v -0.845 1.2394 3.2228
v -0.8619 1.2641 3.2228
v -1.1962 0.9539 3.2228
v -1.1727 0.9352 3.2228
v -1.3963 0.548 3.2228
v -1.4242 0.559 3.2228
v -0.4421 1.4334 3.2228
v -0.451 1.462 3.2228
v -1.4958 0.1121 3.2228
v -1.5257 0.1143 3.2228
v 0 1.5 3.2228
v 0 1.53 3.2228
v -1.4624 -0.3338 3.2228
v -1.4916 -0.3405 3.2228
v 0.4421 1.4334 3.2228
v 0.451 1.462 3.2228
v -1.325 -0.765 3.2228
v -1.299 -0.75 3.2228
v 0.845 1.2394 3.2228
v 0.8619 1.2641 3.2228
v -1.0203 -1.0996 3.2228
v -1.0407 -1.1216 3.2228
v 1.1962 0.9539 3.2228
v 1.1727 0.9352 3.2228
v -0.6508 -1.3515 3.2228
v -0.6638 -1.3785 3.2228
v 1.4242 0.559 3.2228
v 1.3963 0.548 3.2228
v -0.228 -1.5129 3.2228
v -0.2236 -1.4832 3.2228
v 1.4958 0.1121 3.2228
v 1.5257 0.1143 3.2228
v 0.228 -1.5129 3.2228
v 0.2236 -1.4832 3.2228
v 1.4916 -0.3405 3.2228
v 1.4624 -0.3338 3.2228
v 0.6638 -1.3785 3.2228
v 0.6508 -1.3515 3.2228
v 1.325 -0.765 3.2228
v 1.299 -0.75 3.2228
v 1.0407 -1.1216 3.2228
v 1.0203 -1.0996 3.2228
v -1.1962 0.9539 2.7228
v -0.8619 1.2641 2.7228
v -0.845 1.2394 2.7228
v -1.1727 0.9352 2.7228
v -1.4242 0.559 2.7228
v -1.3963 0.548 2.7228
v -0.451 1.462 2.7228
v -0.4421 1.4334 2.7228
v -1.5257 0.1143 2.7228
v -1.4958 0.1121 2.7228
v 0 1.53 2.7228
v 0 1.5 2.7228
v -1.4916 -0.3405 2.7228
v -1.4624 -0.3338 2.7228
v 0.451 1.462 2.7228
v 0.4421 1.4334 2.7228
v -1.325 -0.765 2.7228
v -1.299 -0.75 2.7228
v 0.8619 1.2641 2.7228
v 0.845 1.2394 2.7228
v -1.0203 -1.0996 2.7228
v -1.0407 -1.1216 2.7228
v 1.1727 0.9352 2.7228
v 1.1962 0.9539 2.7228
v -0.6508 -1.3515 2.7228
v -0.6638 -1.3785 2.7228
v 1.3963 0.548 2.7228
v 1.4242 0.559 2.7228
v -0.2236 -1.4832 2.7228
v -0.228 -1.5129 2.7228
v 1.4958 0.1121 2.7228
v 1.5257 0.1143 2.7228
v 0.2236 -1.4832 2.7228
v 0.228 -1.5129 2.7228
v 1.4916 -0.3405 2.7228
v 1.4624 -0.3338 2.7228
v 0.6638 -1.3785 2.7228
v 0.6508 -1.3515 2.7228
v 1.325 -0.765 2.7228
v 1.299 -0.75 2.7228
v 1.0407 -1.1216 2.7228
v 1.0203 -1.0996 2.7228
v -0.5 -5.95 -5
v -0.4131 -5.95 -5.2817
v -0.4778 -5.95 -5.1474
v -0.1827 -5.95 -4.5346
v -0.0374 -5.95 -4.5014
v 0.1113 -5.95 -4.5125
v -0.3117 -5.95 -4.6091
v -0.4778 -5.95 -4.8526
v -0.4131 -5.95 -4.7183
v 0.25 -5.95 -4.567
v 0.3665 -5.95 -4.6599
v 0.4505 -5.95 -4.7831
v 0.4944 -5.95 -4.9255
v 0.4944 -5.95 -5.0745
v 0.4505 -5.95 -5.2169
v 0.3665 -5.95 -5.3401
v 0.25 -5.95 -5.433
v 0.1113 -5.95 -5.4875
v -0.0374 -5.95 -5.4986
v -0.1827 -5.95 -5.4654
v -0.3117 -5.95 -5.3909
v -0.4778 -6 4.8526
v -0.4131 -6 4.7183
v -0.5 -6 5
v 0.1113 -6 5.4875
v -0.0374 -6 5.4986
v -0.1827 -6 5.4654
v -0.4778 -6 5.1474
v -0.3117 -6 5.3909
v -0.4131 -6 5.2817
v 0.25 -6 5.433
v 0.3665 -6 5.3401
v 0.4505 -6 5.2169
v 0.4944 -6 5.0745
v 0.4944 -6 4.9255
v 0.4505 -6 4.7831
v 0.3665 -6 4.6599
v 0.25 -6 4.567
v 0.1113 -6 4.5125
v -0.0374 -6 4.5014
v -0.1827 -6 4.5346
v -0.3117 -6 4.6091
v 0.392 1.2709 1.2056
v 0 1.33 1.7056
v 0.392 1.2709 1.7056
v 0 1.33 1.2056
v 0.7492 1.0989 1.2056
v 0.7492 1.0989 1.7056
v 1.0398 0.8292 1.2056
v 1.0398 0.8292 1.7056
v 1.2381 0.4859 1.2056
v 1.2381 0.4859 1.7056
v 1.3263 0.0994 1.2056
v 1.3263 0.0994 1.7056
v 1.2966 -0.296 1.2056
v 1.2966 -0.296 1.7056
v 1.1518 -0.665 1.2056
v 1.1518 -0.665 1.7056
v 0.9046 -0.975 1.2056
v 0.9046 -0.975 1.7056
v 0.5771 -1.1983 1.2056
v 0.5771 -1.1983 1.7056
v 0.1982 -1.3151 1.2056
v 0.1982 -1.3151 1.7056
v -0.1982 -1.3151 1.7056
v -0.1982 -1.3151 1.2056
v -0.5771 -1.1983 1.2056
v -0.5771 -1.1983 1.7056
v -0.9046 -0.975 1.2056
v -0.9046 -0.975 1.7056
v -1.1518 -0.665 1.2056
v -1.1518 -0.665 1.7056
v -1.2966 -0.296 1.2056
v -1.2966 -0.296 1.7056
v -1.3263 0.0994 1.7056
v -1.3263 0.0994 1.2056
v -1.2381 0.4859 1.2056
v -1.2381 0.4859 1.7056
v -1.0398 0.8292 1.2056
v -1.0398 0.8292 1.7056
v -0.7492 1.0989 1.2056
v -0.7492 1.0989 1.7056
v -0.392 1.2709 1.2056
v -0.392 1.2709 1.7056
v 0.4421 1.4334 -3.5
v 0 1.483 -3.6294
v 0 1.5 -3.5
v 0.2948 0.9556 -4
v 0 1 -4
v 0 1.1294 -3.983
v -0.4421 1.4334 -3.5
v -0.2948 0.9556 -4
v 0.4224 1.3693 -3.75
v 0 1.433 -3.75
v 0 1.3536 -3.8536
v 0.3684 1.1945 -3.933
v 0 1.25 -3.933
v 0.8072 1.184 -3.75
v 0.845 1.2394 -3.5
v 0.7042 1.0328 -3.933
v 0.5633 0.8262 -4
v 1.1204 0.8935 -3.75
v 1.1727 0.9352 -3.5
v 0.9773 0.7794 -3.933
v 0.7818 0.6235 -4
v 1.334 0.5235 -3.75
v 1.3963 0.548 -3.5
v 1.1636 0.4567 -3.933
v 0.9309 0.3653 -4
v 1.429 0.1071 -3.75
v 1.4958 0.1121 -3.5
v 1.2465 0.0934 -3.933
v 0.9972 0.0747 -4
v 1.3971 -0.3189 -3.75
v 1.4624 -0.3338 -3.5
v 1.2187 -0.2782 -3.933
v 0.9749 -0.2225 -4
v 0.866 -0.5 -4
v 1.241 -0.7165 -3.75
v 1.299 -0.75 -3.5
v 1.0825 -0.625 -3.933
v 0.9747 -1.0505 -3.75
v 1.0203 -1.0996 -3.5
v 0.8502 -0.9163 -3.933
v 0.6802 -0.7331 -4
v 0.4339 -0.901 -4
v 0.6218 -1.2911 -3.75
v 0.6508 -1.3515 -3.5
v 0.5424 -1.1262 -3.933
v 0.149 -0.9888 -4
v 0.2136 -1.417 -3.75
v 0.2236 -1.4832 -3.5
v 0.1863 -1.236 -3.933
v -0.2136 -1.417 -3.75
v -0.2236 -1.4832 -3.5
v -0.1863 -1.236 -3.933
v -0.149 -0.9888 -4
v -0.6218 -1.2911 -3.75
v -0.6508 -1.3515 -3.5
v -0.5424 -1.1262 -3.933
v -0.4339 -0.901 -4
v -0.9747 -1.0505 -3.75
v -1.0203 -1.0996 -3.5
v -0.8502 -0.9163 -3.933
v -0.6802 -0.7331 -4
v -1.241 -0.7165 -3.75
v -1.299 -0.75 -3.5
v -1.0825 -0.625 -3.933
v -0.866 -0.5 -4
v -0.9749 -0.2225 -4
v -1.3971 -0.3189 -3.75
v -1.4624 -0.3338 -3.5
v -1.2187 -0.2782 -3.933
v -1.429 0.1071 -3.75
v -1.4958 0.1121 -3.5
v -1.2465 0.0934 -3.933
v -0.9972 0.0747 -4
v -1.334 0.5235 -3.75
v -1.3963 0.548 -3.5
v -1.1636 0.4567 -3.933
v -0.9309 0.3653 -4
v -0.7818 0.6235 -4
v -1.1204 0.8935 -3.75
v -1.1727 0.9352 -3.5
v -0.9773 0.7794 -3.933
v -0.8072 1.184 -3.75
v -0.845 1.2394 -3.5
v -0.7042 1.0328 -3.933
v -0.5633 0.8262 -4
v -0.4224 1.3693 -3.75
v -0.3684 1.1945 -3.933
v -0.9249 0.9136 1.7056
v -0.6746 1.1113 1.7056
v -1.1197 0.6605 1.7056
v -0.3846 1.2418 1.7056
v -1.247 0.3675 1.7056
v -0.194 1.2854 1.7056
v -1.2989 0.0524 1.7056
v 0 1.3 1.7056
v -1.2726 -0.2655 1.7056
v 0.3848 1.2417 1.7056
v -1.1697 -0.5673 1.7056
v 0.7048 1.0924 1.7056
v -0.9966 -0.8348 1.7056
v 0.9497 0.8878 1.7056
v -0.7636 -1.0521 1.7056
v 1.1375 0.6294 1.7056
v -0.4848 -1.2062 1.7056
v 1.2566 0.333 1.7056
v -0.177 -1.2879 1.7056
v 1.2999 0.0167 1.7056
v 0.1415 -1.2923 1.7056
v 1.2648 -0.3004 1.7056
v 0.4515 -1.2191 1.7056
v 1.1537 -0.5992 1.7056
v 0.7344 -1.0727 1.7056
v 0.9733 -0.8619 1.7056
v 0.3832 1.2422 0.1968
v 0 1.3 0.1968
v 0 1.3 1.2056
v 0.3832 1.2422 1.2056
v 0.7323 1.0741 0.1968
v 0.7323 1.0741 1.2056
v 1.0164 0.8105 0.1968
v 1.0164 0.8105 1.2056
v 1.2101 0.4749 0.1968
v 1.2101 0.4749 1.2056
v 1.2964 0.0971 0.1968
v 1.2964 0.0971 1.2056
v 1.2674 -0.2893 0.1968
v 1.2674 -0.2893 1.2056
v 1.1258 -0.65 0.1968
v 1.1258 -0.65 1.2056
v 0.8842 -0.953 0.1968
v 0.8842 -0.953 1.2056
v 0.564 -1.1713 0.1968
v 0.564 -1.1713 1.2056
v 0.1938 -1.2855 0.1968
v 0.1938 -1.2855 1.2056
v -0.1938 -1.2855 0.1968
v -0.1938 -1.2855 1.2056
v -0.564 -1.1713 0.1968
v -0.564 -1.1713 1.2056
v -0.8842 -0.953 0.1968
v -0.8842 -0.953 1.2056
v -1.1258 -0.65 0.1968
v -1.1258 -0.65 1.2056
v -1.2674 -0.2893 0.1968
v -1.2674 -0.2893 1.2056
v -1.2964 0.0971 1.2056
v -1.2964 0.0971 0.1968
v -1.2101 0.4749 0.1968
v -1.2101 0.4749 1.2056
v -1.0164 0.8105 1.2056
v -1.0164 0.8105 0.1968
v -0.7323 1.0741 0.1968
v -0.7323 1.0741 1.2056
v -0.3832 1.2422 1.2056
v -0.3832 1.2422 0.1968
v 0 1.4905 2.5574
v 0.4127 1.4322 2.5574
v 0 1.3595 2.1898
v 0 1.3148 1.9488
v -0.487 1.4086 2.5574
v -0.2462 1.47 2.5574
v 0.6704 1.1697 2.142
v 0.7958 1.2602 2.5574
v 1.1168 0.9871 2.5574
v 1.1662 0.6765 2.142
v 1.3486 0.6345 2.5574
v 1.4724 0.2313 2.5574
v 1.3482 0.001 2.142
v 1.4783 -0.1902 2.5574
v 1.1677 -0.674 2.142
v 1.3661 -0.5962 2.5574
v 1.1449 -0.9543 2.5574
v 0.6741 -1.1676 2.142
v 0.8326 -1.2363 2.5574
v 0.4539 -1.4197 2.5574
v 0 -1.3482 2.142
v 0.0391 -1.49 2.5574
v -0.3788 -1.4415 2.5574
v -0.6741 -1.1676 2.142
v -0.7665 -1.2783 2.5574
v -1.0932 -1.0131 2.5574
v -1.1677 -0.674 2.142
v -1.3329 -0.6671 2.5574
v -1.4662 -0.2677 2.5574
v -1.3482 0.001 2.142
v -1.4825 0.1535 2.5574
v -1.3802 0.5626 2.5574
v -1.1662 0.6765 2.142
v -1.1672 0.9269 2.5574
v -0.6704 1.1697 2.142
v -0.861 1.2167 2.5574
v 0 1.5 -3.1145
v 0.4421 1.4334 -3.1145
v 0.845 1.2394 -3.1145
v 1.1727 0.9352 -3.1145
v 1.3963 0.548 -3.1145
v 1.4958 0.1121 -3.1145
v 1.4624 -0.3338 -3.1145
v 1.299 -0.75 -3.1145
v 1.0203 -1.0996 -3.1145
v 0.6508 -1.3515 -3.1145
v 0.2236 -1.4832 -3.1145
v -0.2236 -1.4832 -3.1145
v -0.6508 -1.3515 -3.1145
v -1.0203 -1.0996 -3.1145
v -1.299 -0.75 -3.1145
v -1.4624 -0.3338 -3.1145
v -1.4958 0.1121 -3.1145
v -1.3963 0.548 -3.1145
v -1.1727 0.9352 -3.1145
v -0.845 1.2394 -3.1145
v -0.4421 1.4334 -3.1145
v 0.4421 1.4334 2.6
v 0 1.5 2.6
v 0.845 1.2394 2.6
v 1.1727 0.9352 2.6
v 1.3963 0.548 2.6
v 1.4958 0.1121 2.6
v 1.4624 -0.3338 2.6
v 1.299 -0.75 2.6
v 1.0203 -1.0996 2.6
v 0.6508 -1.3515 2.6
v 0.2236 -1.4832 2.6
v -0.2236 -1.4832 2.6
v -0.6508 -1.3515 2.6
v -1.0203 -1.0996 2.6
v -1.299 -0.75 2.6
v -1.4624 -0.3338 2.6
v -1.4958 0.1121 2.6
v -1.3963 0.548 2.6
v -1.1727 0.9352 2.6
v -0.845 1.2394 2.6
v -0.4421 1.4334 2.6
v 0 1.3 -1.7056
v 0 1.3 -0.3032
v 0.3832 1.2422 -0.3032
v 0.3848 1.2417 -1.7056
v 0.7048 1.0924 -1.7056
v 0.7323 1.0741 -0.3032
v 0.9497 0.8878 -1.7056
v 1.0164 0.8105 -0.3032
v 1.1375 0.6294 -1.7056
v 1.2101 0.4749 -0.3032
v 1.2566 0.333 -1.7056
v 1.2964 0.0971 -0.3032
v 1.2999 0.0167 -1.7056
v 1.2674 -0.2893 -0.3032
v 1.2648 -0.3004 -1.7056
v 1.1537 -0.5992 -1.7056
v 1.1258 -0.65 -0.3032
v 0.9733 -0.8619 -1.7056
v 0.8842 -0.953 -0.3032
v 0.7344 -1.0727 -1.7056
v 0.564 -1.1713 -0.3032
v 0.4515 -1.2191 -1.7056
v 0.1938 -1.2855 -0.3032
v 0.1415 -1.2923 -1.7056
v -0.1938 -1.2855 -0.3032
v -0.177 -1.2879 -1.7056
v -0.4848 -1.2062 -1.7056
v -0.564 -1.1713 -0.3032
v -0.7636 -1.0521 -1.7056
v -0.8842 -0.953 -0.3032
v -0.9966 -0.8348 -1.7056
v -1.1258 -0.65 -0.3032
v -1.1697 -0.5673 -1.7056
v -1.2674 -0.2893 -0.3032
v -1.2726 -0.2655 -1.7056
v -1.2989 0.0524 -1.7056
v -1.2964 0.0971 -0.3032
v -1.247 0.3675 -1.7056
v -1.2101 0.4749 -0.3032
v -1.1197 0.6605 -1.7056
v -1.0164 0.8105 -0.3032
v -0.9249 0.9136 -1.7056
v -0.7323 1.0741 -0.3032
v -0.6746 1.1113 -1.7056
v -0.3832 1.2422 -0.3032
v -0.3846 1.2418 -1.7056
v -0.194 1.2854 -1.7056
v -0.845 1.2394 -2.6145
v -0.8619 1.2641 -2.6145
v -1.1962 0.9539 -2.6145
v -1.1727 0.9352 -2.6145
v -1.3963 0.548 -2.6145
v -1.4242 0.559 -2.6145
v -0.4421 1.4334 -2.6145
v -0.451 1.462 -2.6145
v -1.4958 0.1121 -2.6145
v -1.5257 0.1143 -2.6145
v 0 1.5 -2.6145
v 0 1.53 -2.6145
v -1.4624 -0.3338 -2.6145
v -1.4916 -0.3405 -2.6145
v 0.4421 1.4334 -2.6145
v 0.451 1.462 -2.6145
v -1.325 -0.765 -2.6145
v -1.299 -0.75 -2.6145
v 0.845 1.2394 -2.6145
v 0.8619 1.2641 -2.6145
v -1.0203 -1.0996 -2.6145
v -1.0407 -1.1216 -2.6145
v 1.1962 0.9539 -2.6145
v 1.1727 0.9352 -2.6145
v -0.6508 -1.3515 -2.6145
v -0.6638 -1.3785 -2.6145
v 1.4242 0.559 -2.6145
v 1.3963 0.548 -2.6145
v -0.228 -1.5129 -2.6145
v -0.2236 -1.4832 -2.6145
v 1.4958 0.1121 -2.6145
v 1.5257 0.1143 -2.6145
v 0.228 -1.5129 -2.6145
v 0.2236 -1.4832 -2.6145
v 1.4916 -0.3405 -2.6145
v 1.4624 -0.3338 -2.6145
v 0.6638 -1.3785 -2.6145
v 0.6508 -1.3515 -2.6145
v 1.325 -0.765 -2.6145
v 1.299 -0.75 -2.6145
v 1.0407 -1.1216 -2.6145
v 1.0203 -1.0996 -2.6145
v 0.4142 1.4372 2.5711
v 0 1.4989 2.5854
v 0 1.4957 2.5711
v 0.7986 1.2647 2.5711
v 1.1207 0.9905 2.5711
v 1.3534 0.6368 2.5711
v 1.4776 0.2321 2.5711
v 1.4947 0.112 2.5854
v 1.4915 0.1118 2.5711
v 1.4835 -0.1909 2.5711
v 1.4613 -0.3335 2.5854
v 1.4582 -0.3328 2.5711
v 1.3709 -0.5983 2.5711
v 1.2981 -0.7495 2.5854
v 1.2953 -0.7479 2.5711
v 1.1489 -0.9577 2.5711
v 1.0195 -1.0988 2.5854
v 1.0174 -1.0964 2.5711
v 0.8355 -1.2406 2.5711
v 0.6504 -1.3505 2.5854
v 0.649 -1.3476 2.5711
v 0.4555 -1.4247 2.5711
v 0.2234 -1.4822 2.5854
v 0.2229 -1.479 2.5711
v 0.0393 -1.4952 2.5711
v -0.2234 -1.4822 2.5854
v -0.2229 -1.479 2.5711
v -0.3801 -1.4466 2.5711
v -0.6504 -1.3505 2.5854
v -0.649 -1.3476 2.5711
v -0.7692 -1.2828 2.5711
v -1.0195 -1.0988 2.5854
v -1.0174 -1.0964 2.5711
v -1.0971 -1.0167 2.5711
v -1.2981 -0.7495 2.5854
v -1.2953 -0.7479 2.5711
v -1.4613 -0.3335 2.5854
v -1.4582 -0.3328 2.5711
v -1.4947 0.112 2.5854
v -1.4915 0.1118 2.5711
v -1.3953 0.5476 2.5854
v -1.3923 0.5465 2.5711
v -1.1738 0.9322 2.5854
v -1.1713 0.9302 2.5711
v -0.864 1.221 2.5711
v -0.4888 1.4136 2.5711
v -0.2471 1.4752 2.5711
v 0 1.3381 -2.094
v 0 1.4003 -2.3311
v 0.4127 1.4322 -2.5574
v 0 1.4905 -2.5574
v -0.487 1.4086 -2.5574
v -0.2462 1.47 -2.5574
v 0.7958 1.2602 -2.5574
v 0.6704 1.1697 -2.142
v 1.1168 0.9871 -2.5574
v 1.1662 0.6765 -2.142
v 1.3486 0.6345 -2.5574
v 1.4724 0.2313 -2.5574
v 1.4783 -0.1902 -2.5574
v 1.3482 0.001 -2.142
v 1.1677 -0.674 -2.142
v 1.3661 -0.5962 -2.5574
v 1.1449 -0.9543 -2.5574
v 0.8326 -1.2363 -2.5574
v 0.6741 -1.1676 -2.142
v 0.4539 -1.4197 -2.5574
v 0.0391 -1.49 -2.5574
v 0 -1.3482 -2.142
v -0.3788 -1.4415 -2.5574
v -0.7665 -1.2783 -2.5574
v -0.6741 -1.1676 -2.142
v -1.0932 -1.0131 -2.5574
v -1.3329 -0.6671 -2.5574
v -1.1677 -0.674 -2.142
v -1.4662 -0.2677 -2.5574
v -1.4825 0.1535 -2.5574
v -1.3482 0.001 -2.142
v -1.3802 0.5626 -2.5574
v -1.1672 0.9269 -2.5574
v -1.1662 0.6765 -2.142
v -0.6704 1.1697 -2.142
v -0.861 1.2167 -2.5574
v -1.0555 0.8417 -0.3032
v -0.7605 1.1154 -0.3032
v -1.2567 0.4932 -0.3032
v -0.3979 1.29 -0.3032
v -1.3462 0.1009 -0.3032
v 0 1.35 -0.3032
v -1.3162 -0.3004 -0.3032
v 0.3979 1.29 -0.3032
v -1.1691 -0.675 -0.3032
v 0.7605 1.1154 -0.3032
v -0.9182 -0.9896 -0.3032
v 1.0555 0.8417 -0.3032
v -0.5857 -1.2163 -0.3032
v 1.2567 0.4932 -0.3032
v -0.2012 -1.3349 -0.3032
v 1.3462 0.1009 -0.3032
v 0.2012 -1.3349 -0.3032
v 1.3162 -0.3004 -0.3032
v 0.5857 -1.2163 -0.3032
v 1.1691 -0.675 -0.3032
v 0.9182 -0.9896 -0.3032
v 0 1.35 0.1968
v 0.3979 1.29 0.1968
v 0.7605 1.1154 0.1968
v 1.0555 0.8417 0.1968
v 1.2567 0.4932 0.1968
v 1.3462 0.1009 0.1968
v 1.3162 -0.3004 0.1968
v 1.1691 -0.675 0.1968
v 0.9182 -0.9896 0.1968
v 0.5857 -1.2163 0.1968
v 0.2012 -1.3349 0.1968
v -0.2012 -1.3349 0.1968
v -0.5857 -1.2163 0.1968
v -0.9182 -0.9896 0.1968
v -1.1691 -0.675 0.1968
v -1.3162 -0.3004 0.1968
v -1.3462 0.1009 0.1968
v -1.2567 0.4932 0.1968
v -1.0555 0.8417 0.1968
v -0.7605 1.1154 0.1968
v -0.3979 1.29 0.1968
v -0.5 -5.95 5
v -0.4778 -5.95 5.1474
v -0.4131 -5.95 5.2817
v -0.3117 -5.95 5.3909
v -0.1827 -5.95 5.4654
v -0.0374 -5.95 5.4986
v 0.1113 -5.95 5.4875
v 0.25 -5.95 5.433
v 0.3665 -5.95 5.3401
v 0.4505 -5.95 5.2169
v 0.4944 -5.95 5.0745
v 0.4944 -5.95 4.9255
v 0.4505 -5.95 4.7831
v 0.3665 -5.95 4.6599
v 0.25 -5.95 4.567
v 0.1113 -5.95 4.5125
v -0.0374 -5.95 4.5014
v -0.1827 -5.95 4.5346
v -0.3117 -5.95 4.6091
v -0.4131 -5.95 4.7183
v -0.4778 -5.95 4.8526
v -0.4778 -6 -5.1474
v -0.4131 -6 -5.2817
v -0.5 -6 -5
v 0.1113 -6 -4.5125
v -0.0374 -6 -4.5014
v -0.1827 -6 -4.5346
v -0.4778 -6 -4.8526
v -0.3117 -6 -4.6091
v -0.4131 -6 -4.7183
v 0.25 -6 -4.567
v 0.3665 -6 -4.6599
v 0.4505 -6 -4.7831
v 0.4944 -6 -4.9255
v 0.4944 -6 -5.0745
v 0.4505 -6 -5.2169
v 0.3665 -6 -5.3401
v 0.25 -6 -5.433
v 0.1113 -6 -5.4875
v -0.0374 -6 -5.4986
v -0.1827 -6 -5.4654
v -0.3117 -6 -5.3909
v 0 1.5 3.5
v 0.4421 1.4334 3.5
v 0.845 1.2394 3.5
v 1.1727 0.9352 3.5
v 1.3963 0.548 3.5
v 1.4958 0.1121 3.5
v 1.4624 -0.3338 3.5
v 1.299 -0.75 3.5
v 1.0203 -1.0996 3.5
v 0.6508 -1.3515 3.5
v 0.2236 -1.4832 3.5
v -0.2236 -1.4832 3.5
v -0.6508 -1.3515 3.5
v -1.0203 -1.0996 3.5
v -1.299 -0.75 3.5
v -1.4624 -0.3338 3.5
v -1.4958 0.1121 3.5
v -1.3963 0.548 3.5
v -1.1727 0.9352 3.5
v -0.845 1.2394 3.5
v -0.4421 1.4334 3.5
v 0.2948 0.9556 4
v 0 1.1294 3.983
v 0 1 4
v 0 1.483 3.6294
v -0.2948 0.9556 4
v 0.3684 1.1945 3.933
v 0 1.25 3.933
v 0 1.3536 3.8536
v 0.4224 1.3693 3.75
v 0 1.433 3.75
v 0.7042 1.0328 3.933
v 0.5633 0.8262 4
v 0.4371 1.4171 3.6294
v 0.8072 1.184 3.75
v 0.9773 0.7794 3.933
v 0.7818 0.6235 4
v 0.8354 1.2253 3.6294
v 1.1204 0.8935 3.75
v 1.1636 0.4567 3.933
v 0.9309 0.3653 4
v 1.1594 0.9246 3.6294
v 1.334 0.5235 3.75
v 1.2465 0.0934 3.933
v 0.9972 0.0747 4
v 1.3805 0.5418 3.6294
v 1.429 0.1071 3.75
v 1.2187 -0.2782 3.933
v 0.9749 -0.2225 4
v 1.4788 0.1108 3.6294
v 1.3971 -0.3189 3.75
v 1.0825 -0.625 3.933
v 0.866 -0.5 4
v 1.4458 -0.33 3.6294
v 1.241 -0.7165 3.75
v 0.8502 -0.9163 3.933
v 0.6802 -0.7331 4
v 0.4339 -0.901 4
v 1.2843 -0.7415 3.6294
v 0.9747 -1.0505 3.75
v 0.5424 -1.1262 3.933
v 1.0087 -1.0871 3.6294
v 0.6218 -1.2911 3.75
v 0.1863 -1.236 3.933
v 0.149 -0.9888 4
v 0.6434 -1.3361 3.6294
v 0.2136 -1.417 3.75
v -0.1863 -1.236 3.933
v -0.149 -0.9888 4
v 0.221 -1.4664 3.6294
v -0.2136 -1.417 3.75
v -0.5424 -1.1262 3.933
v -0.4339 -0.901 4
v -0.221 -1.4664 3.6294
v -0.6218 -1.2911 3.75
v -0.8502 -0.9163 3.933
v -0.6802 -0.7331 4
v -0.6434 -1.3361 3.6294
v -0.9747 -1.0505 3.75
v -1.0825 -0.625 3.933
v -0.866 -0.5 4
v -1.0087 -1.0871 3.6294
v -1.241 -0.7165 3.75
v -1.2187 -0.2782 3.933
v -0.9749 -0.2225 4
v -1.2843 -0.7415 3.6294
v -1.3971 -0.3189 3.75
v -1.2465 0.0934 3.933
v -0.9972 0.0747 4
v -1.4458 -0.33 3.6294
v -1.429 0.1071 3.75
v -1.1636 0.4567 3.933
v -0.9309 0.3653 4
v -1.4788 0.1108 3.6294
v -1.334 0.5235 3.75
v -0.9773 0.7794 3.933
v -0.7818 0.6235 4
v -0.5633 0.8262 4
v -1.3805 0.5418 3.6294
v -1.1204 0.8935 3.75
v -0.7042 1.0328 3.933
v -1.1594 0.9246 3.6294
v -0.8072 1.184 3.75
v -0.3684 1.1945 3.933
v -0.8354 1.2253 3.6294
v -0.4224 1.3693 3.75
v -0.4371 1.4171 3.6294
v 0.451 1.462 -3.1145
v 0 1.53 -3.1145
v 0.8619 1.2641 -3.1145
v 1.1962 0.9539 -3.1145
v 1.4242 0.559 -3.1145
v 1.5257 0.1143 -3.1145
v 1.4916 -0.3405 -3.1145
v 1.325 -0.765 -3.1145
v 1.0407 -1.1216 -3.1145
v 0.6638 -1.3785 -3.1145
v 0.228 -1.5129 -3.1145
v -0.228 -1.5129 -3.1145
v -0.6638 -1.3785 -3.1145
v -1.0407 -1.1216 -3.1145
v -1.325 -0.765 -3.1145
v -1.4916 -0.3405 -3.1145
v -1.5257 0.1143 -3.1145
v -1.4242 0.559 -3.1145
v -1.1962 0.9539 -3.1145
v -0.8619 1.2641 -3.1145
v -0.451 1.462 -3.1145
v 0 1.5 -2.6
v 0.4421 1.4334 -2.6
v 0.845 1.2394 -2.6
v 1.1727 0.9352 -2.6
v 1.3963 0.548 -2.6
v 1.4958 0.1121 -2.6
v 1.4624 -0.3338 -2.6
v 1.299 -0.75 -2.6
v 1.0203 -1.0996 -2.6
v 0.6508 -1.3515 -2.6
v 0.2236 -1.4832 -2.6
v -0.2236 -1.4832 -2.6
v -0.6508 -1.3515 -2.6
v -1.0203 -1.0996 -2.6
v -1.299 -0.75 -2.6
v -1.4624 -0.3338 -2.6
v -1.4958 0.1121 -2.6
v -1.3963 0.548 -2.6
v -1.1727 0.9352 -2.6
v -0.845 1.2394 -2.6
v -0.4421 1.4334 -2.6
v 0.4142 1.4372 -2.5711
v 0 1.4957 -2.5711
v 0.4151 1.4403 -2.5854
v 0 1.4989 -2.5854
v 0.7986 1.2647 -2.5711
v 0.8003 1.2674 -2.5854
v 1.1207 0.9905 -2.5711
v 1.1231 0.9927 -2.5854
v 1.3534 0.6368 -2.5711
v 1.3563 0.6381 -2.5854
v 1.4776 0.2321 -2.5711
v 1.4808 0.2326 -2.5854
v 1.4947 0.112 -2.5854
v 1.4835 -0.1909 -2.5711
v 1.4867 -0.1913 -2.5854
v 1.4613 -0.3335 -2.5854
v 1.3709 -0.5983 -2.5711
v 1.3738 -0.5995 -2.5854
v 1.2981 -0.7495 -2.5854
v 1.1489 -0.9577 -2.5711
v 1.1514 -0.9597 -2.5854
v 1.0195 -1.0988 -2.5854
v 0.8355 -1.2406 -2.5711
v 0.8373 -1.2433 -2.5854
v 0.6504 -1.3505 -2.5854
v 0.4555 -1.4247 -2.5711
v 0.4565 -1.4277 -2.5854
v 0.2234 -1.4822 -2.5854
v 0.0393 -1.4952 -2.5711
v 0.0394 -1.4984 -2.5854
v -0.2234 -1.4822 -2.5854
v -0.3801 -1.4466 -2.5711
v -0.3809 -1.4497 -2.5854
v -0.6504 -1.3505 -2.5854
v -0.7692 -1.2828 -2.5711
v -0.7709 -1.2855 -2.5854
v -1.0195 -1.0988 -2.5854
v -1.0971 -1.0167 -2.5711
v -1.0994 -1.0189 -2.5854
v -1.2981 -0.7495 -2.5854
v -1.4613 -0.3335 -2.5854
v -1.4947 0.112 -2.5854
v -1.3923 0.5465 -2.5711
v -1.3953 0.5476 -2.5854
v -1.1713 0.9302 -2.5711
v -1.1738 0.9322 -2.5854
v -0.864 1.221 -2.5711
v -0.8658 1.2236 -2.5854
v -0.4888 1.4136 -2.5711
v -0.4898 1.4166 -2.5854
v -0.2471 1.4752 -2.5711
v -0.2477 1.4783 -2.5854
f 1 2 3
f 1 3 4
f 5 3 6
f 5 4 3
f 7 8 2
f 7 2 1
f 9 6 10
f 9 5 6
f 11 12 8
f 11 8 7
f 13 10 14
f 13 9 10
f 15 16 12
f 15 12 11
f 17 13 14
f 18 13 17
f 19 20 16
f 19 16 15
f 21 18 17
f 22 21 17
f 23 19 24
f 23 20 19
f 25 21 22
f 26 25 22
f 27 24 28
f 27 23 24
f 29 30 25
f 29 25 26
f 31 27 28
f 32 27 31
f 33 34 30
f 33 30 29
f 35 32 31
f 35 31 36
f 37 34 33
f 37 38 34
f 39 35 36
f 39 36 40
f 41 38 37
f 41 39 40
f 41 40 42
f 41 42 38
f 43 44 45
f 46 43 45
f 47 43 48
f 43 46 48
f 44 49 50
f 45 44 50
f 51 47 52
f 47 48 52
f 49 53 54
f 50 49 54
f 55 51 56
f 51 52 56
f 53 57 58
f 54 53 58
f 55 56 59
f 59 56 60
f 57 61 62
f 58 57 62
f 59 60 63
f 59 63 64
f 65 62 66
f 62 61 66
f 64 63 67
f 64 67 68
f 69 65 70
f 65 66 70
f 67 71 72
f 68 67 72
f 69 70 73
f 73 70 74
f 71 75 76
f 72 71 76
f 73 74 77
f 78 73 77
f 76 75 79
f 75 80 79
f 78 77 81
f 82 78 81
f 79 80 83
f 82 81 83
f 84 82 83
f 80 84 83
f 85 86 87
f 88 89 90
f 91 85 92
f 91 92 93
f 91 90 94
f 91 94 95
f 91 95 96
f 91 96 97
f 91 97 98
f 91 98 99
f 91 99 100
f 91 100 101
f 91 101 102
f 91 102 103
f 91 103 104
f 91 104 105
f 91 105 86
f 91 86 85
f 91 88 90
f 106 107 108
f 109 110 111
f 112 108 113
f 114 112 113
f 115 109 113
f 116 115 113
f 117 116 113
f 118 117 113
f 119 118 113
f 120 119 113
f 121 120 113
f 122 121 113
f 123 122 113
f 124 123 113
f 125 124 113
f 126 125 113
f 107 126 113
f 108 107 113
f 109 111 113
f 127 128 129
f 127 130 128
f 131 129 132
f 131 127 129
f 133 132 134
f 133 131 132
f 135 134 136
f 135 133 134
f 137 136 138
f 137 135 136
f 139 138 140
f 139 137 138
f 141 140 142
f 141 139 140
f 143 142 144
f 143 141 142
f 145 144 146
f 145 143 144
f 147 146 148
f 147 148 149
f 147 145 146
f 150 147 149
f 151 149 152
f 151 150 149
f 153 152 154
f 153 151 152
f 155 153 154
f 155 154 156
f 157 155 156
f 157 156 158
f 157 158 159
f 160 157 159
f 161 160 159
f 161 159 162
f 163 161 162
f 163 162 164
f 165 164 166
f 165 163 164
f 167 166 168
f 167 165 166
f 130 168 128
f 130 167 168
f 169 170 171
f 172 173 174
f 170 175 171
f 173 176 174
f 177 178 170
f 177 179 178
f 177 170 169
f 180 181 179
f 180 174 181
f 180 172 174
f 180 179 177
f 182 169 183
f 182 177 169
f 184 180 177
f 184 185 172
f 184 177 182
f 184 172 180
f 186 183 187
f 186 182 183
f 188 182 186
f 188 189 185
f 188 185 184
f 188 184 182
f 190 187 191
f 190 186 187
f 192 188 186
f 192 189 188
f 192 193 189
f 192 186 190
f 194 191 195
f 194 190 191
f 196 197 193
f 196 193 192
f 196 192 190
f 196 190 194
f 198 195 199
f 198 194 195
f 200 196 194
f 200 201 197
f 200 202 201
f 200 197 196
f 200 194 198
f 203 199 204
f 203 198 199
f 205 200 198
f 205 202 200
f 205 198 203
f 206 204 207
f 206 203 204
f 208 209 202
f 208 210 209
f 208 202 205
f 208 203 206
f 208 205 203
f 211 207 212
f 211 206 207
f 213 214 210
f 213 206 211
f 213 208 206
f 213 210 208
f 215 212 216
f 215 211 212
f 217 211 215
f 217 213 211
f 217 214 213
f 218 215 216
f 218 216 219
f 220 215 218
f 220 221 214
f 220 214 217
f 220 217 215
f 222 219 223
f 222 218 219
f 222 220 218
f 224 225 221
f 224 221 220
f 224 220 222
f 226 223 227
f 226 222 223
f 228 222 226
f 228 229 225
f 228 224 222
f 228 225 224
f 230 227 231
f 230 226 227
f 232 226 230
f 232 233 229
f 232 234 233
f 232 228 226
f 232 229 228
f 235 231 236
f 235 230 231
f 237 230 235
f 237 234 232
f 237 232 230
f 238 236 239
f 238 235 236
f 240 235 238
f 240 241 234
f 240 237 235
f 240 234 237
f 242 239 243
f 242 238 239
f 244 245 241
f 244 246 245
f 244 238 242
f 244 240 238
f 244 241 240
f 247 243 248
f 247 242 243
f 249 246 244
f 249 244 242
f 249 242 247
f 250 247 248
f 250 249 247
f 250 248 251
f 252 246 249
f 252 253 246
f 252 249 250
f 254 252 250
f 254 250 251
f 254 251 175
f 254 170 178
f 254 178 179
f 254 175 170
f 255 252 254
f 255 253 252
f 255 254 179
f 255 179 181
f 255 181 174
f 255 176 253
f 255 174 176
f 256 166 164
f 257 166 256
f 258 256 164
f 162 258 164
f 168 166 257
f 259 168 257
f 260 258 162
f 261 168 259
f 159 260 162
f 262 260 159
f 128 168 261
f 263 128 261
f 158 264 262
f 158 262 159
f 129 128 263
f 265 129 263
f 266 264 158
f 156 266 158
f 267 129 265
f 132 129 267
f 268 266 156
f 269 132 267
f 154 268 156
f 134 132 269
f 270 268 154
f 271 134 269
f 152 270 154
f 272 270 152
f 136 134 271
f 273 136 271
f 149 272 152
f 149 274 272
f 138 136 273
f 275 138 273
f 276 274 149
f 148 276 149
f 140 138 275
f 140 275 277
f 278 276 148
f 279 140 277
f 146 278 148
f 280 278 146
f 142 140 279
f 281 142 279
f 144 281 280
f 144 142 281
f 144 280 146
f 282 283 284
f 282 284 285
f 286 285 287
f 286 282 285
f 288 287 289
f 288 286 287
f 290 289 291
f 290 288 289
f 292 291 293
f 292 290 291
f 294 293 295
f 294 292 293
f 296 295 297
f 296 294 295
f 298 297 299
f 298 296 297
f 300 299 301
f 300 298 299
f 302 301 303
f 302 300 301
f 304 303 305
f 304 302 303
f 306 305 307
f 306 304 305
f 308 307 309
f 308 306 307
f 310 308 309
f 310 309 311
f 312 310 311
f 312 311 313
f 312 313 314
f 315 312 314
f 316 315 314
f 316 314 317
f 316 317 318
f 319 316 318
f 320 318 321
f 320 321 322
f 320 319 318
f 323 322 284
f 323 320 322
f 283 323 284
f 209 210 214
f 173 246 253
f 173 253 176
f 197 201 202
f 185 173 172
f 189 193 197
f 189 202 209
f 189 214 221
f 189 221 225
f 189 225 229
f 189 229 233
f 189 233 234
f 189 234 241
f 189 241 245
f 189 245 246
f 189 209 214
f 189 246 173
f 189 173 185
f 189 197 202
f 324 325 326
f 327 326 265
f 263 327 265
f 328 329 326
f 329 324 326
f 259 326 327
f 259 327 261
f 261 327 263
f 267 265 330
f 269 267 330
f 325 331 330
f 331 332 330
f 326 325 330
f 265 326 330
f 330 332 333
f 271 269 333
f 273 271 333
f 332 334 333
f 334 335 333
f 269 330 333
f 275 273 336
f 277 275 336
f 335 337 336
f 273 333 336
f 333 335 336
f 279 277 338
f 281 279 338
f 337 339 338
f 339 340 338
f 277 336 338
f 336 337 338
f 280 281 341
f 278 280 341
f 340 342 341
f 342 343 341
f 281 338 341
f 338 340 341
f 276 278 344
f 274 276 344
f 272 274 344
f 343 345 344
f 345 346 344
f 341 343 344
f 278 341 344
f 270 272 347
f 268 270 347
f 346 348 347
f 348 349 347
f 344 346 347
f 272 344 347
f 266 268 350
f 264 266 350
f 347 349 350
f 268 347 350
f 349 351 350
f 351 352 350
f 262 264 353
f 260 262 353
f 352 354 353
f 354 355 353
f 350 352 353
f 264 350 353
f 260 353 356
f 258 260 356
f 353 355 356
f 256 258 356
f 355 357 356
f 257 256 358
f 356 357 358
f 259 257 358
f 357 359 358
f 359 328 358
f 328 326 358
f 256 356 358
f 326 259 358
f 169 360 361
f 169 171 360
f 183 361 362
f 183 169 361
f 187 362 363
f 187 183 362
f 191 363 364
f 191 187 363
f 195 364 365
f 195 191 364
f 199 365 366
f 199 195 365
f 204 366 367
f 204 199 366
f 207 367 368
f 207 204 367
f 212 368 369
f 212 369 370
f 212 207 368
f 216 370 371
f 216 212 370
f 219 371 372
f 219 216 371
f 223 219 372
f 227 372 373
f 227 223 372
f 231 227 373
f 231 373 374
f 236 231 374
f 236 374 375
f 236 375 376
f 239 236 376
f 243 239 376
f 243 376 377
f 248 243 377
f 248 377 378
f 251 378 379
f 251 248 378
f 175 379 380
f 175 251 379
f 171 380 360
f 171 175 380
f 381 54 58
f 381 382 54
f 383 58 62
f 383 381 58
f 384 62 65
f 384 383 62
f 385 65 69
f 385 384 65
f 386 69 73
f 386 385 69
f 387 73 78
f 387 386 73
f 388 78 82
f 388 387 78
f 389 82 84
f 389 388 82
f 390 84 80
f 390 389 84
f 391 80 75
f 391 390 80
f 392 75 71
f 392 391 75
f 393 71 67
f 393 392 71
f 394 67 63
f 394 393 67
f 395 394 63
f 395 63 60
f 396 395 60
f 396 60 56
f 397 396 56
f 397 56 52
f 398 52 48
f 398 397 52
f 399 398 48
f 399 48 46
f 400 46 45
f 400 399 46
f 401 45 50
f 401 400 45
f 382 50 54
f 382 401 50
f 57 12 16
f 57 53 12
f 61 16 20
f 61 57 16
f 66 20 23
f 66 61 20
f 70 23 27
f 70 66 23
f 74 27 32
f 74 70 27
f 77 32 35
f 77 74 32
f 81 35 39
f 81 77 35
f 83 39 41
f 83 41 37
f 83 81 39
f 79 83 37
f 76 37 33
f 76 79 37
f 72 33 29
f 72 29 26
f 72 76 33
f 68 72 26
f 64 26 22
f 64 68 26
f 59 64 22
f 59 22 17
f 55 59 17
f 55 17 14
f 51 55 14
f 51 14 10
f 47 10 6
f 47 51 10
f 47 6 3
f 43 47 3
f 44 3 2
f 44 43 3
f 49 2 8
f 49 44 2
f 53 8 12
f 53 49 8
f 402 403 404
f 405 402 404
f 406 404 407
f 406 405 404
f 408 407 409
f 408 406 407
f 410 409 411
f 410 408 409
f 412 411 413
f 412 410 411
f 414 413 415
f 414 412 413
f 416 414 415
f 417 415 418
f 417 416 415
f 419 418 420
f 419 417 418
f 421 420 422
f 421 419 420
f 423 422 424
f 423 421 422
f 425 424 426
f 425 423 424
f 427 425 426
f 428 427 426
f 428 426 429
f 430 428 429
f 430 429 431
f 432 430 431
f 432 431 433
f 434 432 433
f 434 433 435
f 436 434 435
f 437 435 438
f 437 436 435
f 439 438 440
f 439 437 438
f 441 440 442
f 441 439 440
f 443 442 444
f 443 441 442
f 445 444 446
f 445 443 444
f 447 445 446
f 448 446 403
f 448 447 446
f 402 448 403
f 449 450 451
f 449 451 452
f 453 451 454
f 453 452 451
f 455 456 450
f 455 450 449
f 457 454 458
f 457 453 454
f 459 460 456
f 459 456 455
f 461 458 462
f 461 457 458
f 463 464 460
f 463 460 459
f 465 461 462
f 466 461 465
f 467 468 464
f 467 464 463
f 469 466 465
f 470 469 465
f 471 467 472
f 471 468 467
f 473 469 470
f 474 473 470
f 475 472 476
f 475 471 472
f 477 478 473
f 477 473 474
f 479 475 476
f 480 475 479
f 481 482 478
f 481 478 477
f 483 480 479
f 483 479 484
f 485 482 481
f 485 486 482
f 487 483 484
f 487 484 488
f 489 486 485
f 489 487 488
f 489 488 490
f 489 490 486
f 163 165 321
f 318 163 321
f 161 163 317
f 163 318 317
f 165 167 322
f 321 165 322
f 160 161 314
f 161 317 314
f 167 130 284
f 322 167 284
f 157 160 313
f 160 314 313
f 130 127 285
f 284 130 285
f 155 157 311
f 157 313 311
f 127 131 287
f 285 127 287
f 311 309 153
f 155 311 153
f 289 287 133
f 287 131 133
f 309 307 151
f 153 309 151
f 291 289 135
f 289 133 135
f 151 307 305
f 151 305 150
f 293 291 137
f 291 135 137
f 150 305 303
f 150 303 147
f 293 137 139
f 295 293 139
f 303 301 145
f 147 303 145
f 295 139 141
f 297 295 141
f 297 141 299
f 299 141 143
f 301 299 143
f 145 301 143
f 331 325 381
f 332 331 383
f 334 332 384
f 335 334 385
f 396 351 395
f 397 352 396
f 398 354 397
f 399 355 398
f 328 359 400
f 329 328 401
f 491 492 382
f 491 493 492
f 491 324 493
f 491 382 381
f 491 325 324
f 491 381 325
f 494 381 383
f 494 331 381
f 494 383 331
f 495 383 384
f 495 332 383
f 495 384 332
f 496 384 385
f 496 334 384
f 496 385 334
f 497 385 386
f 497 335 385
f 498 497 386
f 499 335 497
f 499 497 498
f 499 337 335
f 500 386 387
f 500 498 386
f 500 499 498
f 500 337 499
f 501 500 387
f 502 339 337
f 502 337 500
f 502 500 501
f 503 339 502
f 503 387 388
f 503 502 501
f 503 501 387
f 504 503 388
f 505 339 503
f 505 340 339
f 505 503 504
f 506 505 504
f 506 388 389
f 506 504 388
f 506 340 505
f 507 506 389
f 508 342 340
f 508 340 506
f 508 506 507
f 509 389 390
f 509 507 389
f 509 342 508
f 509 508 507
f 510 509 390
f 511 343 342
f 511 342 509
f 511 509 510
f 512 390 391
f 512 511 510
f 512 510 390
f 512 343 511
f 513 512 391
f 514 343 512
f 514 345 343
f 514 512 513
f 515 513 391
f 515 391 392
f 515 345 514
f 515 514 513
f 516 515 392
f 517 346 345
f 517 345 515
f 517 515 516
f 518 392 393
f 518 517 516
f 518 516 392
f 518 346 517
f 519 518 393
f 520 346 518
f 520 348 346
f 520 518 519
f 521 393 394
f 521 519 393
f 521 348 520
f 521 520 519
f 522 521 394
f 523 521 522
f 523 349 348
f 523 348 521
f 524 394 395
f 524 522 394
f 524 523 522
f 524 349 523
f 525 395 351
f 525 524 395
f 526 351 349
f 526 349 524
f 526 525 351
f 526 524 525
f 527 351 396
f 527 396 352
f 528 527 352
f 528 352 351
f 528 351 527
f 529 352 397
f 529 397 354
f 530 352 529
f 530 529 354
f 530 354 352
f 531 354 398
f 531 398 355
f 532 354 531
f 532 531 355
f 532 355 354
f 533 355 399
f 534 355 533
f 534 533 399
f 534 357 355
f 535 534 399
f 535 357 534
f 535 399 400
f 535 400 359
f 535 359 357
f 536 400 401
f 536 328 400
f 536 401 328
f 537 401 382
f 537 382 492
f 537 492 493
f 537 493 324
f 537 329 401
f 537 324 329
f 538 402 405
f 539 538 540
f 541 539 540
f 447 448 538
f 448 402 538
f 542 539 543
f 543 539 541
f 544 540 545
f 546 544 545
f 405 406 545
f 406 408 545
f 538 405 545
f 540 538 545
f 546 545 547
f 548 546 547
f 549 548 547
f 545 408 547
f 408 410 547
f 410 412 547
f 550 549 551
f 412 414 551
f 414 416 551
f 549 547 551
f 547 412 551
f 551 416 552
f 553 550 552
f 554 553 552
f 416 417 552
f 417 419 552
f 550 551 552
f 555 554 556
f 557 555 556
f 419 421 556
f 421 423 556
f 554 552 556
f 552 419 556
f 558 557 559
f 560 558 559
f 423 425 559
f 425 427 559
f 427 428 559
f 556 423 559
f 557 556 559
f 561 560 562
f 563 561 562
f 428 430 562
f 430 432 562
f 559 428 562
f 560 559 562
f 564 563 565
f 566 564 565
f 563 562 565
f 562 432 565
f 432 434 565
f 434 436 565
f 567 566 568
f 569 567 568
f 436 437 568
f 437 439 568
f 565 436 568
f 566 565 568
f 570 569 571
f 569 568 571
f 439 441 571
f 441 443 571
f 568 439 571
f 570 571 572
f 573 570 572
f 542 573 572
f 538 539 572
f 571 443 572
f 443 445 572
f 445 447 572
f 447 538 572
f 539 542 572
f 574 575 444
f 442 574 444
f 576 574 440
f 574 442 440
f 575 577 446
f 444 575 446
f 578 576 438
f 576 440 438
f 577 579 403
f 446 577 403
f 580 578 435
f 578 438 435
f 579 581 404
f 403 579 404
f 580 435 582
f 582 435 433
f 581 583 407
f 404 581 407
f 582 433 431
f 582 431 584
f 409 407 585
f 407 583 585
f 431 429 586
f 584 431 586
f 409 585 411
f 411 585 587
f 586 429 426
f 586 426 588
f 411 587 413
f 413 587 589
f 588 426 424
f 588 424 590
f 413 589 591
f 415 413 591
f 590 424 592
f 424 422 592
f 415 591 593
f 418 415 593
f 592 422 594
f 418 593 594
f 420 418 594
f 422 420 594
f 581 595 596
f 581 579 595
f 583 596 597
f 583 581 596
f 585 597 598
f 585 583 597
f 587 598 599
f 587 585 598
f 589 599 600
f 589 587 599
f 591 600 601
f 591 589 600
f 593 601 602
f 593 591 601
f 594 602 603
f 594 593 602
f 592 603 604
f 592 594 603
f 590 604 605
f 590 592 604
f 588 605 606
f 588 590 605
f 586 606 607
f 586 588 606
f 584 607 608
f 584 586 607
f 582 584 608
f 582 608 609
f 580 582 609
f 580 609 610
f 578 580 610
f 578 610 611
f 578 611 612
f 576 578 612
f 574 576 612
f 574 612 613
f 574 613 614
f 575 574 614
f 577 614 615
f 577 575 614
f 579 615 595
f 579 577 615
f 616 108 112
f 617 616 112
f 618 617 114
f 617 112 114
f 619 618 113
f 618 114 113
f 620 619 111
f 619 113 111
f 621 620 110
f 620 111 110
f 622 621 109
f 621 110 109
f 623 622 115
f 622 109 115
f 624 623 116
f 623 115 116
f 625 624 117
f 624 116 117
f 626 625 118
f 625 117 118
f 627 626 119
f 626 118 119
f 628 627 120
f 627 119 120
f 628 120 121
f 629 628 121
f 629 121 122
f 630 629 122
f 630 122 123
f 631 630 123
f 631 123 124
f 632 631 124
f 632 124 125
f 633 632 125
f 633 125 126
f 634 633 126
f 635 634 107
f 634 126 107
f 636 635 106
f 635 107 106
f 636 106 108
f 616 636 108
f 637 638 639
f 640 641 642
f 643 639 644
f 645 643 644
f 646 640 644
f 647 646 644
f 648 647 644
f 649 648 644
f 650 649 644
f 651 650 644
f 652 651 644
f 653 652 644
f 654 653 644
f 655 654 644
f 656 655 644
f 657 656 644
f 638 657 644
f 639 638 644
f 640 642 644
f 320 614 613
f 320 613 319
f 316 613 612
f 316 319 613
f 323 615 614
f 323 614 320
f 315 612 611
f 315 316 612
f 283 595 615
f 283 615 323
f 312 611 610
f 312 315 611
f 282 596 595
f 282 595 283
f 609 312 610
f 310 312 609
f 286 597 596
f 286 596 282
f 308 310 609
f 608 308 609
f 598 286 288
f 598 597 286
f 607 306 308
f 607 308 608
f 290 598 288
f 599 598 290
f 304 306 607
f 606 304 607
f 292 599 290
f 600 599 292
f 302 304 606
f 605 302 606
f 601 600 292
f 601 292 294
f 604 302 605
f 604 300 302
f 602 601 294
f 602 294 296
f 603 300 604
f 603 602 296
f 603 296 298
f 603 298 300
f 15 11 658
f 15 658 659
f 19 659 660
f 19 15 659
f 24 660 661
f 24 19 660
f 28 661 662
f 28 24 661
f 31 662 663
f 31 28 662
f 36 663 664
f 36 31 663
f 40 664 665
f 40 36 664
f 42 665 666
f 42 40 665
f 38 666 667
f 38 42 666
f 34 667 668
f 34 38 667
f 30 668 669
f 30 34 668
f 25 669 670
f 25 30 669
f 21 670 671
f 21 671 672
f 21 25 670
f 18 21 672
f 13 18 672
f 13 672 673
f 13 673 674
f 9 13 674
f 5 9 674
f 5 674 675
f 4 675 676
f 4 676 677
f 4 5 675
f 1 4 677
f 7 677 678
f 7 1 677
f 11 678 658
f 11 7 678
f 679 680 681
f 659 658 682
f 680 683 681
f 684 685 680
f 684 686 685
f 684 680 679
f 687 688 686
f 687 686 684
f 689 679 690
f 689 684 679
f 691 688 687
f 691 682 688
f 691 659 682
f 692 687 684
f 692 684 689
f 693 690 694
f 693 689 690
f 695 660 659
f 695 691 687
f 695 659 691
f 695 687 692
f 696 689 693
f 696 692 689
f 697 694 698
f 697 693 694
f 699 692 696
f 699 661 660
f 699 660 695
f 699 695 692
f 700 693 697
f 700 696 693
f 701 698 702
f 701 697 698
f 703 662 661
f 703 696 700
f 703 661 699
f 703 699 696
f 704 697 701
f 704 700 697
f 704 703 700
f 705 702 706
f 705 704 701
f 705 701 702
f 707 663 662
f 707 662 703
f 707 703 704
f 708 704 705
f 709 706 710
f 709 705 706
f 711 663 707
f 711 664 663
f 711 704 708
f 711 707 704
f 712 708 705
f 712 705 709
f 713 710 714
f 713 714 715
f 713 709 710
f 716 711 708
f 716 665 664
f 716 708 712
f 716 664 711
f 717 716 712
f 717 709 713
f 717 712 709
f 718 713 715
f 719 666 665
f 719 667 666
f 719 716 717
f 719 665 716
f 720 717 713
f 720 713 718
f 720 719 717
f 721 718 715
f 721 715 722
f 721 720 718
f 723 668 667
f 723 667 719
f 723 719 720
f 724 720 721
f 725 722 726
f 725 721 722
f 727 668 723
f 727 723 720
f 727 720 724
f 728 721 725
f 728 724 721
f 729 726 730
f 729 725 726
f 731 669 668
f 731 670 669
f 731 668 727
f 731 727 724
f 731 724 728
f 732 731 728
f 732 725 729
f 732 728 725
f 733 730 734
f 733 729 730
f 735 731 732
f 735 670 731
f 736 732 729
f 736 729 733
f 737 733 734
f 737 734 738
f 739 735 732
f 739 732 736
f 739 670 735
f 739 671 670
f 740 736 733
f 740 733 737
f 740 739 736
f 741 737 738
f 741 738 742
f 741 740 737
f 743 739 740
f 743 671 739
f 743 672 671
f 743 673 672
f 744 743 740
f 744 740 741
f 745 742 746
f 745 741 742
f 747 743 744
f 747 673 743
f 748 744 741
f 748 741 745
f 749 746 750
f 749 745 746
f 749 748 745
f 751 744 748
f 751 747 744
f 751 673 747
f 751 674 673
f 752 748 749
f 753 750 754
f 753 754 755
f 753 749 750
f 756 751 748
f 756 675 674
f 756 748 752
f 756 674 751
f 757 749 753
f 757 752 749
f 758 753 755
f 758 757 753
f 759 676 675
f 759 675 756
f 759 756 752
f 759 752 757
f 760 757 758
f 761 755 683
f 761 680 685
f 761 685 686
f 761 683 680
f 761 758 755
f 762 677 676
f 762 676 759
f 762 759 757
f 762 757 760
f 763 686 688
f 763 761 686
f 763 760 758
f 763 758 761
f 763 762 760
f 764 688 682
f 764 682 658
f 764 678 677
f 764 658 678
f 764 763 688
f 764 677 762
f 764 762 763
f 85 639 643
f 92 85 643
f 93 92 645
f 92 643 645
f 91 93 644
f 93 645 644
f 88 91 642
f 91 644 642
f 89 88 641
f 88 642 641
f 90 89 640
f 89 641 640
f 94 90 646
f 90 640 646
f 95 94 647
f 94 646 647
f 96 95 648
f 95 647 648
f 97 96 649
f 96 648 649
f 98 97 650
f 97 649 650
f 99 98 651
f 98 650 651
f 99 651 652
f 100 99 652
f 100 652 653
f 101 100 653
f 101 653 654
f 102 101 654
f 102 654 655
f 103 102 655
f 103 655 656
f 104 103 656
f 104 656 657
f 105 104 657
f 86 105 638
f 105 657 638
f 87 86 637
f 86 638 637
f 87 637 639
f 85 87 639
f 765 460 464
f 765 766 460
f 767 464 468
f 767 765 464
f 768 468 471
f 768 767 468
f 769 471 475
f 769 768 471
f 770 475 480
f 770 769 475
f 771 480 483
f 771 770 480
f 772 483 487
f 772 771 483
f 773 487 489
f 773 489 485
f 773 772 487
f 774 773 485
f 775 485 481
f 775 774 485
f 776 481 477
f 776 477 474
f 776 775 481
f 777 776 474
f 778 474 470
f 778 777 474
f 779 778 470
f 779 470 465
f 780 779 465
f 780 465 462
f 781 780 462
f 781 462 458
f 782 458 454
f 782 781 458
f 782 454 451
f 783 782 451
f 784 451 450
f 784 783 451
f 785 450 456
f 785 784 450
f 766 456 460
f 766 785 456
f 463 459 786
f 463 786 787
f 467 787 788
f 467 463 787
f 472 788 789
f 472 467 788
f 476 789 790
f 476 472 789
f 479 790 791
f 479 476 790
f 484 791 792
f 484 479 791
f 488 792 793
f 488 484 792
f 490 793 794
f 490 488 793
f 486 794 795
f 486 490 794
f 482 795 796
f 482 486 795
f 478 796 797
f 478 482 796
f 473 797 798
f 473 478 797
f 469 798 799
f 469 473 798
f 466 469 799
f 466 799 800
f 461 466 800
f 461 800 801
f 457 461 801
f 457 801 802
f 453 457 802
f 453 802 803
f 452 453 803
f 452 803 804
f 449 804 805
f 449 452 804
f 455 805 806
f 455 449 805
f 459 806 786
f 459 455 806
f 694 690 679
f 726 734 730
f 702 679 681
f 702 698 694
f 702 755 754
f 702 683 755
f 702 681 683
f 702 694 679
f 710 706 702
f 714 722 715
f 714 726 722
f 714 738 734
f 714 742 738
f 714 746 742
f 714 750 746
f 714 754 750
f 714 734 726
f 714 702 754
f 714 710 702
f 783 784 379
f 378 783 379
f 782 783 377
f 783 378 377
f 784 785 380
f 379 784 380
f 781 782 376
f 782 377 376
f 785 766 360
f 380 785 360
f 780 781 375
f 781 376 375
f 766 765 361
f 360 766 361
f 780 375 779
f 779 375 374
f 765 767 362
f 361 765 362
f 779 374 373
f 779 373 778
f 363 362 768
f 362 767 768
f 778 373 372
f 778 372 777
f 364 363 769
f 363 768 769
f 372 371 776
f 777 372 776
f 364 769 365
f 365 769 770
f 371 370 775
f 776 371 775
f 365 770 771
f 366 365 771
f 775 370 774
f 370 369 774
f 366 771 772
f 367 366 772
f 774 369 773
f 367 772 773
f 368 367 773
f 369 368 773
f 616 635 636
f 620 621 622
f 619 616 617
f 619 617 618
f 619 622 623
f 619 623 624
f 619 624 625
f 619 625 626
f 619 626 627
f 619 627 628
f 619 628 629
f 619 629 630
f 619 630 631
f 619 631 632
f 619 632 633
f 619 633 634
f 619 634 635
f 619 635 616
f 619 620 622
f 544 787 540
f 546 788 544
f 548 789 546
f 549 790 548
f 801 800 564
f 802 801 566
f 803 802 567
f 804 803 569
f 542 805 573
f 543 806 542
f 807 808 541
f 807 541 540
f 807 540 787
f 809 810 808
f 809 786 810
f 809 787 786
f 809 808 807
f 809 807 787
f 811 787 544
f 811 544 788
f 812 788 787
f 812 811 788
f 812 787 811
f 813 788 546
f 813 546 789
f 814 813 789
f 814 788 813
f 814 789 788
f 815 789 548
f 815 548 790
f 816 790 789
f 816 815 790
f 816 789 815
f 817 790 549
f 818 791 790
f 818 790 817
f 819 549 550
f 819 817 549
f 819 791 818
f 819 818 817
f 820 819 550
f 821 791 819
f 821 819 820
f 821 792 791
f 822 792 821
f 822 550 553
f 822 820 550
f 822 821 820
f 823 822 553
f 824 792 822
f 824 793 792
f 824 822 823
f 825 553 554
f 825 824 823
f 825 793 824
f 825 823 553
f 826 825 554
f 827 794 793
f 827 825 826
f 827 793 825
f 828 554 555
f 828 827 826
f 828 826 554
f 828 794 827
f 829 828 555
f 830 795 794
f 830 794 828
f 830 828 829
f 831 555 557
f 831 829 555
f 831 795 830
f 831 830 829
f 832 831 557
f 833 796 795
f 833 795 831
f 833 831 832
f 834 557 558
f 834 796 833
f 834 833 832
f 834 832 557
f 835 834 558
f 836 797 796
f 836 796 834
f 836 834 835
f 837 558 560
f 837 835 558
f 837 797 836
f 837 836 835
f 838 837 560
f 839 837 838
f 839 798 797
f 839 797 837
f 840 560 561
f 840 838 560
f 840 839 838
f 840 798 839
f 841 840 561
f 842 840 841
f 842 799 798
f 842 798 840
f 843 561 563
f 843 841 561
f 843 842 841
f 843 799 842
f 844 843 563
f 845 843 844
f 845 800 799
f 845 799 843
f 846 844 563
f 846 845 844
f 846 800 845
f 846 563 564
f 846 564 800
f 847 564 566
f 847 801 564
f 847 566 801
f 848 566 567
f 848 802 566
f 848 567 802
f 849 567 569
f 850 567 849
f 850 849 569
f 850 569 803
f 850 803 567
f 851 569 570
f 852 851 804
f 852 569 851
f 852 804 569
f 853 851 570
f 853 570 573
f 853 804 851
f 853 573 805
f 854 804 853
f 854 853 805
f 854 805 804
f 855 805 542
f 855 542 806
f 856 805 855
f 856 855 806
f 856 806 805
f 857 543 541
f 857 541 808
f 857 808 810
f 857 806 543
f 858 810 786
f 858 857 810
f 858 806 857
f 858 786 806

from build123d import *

# Parameters (mm, degrees)
FILLET1_R           = 2
SKETCH2_W           = 0.5
SKETCH2_H           = 0.029991608
SKETCH3_W           = 0.5
SKETCH3_H           = 0.05
SKETCH4_W           = 0.5
SKETCH4_H           = 0.03
SKETCH5_W           = 0.5
SKETCH5_H           = 0.03
SKETCH7_R           = 0.5
BOSS_EXTRUDE1_DEPTH = 0.05
SKETCH12_R          = 0.5
BOSS_EXTRUDE2_DEPTH = 0.05


with BuildPart() as part:
    # Sketch1 → Revolve1 (revolve)
    with BuildSketch(Plane(origin=(0, 0, 0), x_dir=(0, 0, -1), z_dir=(1, 0, 0))):
        with BuildLine():
            Line((2.6, 1.5), (3.5, 1.5))
            ThreePointArc((3.5, 1.5), (3.853553391, 1.353553391), (4, 1))
            Line((4, 1), (4, 0))
            Line((4, 0), (-4, 0))
            Line((-4, 0), (-4, 1))
            ThreePointArc((-4, 1), (-3.853553391, 1.353553391), (-3.5, 1.5))
            Line((-3.5, 1.5), (-2.6, 1.5))
            ThreePointArc((-2.6, 1.5), (-2.529289322, 1.470710678), (-2.5, 1.4))
            Line((-2.5, 1.4), (-2.5, 1.3))
            Line((-2.5, 1.3), (2.5, 1.3))
            Line((2.5, 1.3), (2.5, 1.4))
            ThreePointArc((2.5, 1.4), (2.529289322, 1.470710678), (2.6, 1.5))
        make_face()
    revolve(axis=Axis((0, 0, 30.94688027), (0, 0, -1)))

    # Fillet1
    fillet1_edges = [part.edges().sort_by_distance(p)[0] for p in [
        (0, -1.3, -2.5),
        (0, -1.3, 2.5),
    ]]
    fillet(fillet1_edges, radius=FILLET1_R)

    # Sketch2 → Revolve2 (revolve)
    with BuildSketch(Plane(origin=(0, 0, 0), x_dir=(0, 0, -1), z_dir=(1, 0, 0))):
        with Locations((-1.455572809, 1.314995804)):
            Rectangle(SKETCH2_W, SKETCH2_H)
    revolve(axis=Axis((0, 0, 2.184724067), (0, 0, -1)))

    # Sketch3 → Revolve3 (revolve)
    with BuildSketch(Plane(origin=(0, 0, 0), x_dir=(0, 0, -1), z_dir=(1, 0, 0))):
        with Locations((0.053199548, 1.325)):
            Rectangle(SKETCH3_W, SKETCH3_H)
    revolve(axis=Axis((0, 0, 0.48939527), (0, 0, -1)))

    # Sketch4 → Revolve4 (revolve)
    with BuildSketch(Plane(origin=(0, 0, 0), x_dir=(0, 0, -1), z_dir=(1, 0, 0))):
        with Locations((-2.972757668, 1.515)):
            Rectangle(SKETCH4_W, SKETCH4_H)
    revolve(axis=Axis((0, 0, 0.449237838), (0, 0, -1)))

    # Sketch5 → Revolve5 (revolve)
    with BuildSketch(Plane(origin=(0, 0, 0), x_dir=(0, 0, -1), z_dir=(1, 0, 0))):
        with Locations((2.864549609, 1.515)):
            Rectangle(SKETCH5_W, SKETCH5_H)
    revolve(axis=Axis((0, 0, 0.313399994), (0, 0, -1)))


with BuildPart() as body_2:
    # Sketch7 → Boss-Extrude1 (new body)
    with BuildSketch(Plane(origin=(0, -6, 0), x_dir=(-1, 0, 0), z_dir=(0, 1, 0))):
        with Locations((0, 5)):
            Circle(SKETCH7_R)
    extrude(amount=BOSS_EXTRUDE1_DEPTH)


with BuildPart() as body_3:
    # Sketch12 → Boss-Extrude2 (new body)
    with BuildSketch(Plane(origin=(0, -6, 0), x_dir=(-1, 0, 0), z_dir=(0, 1, 0))):
        with Locations((0, -5)):
            Circle(SKETCH12_R)
    extrude(amount=BOSS_EXTRUDE2_DEPTH)


solid = Compound([part.part, body_2.part, body_3.part])
